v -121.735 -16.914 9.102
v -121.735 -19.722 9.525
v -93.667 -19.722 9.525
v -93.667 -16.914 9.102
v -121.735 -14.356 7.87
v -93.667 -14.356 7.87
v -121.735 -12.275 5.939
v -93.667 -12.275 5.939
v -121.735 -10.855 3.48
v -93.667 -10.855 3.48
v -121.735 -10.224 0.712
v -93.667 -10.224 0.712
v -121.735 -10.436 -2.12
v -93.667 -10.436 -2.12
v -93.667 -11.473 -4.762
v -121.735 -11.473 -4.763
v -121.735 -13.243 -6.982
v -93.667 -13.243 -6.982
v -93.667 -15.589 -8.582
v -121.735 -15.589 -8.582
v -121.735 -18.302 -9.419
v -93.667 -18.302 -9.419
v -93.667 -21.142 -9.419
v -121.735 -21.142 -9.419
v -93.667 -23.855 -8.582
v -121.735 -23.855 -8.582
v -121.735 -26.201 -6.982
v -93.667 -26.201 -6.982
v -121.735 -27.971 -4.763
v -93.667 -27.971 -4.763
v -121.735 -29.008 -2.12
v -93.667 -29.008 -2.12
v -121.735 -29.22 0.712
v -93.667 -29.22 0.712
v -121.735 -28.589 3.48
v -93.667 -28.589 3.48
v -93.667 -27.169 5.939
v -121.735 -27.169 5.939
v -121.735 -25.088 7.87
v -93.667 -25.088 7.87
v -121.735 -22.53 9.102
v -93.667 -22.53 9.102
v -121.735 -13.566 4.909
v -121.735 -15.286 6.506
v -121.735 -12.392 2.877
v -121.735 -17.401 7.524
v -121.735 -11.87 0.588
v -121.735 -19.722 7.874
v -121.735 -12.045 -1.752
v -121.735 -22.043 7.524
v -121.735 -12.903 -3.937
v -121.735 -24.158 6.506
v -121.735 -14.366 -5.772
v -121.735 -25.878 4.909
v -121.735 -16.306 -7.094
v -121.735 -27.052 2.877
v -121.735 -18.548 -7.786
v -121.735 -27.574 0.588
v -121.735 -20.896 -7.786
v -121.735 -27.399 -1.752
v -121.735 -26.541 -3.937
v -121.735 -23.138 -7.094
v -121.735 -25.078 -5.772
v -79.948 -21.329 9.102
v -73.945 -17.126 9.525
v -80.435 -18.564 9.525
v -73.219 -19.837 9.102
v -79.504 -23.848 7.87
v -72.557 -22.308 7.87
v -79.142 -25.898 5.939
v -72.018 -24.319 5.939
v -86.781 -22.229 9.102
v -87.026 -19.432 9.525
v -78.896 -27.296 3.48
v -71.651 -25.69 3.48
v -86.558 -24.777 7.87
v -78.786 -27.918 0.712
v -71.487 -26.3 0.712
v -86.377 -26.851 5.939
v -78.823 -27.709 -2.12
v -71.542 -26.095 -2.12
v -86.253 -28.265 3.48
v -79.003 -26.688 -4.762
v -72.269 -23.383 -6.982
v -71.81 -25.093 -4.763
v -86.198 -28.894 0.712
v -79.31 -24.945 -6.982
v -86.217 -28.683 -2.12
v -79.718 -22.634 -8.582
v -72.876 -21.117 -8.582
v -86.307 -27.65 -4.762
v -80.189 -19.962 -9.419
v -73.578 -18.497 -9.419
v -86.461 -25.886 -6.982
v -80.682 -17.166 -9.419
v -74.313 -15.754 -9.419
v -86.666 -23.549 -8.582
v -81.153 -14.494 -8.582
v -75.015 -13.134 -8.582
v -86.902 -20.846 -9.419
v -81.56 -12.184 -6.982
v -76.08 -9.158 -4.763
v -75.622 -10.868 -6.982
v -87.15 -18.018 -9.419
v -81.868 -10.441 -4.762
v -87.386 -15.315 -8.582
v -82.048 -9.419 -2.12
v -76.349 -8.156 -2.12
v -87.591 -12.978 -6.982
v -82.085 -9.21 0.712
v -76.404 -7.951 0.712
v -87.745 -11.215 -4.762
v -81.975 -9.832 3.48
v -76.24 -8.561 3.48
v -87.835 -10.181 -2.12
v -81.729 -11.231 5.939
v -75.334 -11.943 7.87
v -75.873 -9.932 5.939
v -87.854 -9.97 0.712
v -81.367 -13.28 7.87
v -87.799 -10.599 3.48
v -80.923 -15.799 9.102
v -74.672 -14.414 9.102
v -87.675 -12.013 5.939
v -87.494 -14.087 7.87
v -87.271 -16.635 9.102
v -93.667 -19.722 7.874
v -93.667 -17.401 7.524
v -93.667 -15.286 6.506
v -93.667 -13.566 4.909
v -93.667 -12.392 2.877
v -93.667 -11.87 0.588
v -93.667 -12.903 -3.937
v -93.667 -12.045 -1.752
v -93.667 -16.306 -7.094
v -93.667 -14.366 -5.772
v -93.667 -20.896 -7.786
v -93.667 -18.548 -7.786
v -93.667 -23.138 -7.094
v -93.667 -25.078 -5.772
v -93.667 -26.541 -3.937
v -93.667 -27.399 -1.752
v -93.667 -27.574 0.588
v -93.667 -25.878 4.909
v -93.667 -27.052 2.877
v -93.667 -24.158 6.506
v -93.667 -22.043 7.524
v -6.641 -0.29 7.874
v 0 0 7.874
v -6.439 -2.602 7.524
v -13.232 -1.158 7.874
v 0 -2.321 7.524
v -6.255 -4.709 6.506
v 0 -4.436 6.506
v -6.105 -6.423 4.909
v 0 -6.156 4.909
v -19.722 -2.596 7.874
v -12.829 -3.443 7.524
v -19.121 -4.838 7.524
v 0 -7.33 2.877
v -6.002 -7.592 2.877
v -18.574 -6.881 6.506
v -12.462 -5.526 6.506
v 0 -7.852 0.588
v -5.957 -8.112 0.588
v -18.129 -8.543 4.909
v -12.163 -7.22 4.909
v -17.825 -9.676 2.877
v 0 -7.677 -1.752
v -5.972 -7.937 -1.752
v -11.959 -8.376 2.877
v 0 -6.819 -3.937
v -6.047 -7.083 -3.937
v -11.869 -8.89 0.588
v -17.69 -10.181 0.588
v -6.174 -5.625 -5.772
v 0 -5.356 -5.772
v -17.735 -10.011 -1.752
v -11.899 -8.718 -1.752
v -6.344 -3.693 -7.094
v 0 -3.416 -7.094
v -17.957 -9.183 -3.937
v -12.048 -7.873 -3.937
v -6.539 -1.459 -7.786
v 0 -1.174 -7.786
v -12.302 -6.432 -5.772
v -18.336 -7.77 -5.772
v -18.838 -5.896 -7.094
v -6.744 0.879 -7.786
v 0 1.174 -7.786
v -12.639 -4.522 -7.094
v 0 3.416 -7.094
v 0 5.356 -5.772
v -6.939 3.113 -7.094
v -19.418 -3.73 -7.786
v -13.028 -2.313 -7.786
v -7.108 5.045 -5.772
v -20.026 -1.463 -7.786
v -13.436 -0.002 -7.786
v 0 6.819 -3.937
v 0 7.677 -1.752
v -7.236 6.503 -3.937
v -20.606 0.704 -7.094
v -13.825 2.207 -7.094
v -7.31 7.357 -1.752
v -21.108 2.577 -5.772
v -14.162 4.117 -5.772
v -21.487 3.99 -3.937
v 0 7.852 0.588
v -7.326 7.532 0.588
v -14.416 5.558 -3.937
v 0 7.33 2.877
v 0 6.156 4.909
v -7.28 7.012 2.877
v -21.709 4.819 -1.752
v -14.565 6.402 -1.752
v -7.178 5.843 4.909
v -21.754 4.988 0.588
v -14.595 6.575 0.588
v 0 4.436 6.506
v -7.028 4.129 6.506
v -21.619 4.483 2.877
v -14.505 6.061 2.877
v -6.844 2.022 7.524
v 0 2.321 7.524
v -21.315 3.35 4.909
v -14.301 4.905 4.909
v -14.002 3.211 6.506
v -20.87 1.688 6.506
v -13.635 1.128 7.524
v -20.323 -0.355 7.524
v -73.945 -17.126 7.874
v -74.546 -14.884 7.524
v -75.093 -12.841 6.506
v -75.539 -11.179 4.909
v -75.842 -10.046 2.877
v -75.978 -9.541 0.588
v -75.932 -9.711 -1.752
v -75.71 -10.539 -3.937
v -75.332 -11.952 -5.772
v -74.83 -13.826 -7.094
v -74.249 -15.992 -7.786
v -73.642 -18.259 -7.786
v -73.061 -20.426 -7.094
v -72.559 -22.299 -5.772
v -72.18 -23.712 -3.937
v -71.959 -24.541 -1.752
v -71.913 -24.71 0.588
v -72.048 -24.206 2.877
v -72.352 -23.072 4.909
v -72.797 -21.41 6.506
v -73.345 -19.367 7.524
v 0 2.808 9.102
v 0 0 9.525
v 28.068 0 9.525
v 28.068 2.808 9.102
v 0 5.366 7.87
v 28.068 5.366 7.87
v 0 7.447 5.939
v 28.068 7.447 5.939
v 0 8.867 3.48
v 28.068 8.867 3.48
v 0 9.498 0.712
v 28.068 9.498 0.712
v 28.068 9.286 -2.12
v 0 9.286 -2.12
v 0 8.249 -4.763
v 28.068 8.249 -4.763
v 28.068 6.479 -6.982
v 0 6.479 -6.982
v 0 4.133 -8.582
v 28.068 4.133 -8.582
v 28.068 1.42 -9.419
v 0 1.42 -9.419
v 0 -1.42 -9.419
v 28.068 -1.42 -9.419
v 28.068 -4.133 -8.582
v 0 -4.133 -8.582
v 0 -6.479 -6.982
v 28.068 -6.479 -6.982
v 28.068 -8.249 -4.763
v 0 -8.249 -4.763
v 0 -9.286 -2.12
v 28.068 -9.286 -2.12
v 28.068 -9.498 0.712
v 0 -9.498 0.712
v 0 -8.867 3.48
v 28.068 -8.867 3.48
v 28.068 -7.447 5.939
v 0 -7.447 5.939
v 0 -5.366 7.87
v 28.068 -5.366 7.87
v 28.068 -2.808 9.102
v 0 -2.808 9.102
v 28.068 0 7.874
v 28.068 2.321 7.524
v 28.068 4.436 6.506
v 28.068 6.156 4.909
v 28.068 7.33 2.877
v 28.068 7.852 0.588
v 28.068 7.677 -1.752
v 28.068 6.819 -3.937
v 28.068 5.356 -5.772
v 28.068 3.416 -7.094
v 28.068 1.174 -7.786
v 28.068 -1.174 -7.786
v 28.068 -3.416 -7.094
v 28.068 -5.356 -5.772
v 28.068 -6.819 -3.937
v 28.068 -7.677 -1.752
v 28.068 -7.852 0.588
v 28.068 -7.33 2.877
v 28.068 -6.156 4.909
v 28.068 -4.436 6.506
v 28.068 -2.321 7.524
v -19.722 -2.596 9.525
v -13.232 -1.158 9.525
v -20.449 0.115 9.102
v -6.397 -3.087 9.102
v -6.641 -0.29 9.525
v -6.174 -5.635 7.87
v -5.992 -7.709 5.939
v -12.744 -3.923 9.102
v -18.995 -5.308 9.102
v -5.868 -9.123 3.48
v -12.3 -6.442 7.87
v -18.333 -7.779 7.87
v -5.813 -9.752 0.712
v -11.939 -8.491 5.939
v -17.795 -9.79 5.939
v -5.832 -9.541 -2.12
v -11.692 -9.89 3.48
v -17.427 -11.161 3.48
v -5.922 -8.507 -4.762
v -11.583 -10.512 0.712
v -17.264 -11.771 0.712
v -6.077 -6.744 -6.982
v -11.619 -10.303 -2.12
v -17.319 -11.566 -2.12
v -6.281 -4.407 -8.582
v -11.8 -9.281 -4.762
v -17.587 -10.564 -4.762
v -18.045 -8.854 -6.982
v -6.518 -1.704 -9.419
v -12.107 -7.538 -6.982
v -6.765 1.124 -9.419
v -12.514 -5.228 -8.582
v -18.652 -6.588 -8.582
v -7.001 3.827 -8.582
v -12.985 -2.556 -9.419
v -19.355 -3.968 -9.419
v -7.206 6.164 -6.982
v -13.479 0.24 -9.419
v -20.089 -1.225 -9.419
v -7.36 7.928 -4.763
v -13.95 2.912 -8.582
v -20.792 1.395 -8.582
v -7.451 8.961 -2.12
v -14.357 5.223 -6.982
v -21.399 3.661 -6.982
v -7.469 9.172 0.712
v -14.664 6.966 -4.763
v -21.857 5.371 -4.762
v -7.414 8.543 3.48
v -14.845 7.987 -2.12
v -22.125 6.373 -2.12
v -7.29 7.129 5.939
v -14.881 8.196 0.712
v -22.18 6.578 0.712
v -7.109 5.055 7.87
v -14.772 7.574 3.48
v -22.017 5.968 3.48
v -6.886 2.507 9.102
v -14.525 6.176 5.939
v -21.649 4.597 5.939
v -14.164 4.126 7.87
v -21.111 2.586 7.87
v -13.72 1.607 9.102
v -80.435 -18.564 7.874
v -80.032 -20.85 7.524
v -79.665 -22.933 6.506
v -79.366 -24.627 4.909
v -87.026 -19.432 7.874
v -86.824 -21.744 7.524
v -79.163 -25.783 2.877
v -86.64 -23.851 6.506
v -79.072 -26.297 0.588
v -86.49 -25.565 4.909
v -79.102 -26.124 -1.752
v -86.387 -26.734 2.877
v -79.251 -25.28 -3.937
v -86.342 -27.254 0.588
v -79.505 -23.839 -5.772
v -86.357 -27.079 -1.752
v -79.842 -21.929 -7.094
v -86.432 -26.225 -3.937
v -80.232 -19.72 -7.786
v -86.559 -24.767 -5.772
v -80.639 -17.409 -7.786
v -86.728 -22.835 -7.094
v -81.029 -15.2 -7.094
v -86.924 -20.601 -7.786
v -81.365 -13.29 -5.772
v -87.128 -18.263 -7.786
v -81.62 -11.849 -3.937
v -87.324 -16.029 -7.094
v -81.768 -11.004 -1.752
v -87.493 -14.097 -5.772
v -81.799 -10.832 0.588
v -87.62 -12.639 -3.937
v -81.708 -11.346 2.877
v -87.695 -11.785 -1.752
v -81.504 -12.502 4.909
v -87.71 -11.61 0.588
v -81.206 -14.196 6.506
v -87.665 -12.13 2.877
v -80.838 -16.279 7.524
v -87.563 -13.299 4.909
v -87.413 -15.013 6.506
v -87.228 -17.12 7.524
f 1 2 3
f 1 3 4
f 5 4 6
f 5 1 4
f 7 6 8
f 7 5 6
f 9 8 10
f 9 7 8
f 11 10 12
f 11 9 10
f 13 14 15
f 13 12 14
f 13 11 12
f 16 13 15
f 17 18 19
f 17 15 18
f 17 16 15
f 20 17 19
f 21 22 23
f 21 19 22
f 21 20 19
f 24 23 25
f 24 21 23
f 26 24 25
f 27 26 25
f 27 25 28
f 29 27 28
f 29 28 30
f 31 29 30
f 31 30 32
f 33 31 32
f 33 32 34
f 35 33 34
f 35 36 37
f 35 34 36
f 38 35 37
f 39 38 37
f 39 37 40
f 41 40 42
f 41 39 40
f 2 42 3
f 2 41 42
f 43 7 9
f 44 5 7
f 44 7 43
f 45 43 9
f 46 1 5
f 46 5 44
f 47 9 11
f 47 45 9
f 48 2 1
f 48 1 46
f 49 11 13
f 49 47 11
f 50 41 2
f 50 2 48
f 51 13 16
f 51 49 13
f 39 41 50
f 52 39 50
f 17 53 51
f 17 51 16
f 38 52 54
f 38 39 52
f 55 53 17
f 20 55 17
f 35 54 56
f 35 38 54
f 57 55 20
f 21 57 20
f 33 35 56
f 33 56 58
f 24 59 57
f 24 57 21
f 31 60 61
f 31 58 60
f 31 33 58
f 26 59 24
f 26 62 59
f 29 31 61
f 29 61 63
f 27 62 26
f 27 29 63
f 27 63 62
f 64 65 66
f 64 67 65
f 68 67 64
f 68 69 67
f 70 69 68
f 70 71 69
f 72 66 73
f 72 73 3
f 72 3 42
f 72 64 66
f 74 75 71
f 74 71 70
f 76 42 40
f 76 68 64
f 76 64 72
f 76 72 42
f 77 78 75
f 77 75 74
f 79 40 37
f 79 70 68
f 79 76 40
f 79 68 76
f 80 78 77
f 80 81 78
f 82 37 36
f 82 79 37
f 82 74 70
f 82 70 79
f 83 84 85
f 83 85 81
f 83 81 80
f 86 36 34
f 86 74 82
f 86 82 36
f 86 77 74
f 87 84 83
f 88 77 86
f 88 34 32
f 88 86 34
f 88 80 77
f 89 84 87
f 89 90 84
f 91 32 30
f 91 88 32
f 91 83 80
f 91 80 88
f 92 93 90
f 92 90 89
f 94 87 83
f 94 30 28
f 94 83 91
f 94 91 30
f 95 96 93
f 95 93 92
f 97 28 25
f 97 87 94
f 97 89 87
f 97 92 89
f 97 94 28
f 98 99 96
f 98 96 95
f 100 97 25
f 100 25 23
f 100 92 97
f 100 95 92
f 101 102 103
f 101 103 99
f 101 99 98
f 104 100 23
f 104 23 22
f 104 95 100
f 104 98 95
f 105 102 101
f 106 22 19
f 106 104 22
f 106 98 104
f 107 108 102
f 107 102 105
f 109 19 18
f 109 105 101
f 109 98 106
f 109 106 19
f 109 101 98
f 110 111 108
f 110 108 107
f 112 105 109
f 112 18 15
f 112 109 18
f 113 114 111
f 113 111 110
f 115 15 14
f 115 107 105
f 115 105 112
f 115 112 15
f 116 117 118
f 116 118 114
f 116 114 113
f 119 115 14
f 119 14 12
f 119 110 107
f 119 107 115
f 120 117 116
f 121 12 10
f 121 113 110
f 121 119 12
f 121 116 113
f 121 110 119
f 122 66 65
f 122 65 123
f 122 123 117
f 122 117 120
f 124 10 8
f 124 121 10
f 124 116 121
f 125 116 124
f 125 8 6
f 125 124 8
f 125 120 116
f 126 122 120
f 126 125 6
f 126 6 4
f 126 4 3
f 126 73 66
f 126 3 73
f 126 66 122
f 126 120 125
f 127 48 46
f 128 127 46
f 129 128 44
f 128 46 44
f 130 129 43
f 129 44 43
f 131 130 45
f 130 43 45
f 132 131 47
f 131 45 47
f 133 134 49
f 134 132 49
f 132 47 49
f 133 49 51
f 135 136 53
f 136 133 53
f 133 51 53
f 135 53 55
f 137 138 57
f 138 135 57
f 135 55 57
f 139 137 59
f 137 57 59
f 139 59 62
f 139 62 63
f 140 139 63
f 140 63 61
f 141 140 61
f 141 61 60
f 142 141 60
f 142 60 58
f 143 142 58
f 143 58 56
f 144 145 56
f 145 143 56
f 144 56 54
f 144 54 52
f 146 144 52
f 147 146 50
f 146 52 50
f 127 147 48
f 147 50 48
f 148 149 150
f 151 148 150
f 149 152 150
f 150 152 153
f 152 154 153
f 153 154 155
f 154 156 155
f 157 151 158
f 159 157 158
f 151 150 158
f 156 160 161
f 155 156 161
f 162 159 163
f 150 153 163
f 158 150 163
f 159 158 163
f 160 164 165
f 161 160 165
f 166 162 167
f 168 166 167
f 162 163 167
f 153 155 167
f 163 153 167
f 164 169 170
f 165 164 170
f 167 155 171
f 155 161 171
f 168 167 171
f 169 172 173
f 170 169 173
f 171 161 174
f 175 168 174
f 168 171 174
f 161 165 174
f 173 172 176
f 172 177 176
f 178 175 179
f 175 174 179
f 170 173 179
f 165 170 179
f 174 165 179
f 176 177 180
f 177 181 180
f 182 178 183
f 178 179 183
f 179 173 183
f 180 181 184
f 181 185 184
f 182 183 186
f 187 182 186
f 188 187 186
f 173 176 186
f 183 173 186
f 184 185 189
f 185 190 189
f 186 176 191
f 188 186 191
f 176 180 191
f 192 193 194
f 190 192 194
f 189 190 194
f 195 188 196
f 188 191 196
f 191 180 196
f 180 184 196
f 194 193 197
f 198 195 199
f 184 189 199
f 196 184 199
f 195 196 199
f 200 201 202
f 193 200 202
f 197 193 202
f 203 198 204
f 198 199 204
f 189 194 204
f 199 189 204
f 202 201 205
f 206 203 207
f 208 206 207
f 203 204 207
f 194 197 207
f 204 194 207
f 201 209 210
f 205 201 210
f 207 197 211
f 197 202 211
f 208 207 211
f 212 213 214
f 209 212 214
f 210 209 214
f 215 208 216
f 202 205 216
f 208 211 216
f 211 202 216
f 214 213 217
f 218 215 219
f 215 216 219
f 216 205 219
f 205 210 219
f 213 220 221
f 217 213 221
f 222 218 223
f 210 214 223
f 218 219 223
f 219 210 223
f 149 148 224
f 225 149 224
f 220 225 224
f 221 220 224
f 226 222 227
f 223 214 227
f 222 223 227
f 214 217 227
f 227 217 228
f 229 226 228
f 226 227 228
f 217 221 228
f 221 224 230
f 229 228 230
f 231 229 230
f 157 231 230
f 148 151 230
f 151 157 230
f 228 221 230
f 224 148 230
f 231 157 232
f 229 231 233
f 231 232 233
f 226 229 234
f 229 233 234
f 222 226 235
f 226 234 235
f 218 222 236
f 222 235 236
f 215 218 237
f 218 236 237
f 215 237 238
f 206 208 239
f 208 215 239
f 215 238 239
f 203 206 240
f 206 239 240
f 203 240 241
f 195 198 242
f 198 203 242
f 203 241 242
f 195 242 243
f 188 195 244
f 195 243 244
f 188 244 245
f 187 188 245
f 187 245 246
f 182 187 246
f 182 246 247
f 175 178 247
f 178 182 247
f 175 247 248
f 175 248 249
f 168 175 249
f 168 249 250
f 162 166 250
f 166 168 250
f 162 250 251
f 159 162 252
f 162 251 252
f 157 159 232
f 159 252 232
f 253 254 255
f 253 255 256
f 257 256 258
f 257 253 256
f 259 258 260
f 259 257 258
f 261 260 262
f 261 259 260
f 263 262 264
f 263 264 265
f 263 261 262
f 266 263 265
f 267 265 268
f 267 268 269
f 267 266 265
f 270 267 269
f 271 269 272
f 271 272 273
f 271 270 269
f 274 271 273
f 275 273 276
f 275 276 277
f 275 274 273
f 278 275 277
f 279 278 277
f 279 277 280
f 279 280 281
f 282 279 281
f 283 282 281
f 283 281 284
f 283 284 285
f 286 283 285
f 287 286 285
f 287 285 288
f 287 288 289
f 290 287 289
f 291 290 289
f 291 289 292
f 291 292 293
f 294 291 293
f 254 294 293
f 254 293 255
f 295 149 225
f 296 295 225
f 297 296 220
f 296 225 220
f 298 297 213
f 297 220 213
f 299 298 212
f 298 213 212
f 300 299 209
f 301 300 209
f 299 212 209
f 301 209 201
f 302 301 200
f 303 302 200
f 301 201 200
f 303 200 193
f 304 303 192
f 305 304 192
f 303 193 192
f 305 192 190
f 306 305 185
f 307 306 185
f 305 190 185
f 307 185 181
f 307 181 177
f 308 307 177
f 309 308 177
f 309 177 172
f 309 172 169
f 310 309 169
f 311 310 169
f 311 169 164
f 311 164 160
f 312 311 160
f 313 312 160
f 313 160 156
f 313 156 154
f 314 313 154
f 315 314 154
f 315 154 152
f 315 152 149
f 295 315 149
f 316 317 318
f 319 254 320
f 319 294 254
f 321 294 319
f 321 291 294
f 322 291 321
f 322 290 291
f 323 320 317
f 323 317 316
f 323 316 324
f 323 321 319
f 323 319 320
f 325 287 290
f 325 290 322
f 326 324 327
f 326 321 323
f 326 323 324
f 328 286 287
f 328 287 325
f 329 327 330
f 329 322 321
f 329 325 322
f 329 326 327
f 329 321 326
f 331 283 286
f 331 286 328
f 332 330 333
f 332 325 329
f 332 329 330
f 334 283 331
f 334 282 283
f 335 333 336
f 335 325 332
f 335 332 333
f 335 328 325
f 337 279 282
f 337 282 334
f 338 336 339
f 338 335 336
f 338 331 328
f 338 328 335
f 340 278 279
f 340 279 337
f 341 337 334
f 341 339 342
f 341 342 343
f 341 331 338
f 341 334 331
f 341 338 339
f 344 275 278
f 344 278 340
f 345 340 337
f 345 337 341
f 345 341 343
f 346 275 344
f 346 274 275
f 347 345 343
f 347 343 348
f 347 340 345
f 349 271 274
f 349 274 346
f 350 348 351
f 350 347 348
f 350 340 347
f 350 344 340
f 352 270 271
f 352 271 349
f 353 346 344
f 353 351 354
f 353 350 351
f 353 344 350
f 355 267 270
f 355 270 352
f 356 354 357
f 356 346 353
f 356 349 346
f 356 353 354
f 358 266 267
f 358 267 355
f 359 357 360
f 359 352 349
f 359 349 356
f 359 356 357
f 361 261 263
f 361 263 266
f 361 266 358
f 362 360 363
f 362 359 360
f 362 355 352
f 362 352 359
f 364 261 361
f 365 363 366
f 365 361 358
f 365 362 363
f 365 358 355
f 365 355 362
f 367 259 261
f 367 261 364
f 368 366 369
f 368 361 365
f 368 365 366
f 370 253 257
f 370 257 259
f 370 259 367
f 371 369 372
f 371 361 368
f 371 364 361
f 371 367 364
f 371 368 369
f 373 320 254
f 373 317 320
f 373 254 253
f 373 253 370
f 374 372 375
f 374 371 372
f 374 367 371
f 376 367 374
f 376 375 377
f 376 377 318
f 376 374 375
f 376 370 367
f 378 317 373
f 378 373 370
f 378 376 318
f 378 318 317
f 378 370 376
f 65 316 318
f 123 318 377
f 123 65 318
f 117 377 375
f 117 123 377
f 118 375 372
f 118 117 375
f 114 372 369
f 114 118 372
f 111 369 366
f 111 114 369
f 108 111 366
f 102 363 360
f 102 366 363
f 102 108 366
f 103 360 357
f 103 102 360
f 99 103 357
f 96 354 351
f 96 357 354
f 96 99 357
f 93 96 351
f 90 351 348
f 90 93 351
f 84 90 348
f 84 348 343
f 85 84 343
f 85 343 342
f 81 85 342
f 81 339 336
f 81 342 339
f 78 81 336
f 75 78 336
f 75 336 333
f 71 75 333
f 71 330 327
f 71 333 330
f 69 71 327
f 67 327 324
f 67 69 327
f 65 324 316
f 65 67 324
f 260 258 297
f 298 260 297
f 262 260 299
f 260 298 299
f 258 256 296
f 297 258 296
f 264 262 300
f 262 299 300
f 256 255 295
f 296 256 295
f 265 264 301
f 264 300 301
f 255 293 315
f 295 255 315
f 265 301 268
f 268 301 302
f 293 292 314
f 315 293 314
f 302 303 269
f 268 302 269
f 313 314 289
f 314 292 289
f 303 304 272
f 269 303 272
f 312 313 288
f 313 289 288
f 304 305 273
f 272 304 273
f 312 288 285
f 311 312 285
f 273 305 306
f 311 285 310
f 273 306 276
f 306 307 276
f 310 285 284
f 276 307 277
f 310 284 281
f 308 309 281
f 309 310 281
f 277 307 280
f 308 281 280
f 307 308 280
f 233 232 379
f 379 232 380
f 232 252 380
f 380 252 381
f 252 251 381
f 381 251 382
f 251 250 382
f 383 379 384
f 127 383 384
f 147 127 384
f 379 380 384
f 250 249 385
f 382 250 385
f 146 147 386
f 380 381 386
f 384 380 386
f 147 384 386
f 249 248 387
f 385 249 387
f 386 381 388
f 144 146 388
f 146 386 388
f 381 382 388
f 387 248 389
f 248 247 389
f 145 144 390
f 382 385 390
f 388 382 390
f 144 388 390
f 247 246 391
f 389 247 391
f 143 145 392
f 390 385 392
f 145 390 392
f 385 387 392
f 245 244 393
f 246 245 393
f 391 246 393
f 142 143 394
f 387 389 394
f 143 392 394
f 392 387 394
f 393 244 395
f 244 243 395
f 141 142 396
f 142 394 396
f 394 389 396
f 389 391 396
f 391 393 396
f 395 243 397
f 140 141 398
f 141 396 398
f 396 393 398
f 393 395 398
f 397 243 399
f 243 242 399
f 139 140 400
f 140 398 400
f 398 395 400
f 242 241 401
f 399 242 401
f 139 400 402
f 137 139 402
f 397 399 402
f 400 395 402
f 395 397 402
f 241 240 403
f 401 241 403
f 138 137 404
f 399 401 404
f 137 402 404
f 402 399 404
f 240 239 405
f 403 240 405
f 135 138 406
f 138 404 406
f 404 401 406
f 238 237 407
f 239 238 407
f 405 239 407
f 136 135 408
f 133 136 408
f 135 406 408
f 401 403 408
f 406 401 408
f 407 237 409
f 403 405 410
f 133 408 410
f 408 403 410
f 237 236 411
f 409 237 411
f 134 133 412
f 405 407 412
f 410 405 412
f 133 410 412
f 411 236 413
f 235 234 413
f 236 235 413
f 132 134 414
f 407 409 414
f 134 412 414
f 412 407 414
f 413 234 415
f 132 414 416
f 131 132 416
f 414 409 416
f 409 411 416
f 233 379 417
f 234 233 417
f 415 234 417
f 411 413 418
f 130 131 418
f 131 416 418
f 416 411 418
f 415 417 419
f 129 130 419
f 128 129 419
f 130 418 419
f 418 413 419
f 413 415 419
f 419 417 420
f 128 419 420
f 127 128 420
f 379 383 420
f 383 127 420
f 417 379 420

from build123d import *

# Parameters (mm, degrees)
SKETCH2_R   = 9.525
SKETCH2_R_2 = 7.874


with BuildPart() as part:
    # Sweep1: sweep along a path in Sketch1
    with BuildLine(Plane.XY) as sweep1_path:
        Line((28.068079684, 0), (0, 0))
        ThreePointArc((0, 0), (-9.946095847, -0.651901563), (-19.722011237, -2.596452037))
        Line((-19.722011237, -2.596452037), (-73.945377359, -17.1255592))
        ThreePointArc((-73.945377359, -17.1255592), (-83.721292748, -19.070109673), (-93.667388596, -19.722011237))
        Line((-93.667388596, -19.722011237), (-121.735468279, -19.722011237))
    # Sketch2 → Sweep1 (sweep)
    with BuildSketch(Plane.ZY.offset(-28.068079684)):
        Circle(SKETCH2_R)
        Circle(SKETCH2_R_2, mode=Mode.SUBTRACT)
    sweep(path=sweep1_path.line)


solid = part.part
